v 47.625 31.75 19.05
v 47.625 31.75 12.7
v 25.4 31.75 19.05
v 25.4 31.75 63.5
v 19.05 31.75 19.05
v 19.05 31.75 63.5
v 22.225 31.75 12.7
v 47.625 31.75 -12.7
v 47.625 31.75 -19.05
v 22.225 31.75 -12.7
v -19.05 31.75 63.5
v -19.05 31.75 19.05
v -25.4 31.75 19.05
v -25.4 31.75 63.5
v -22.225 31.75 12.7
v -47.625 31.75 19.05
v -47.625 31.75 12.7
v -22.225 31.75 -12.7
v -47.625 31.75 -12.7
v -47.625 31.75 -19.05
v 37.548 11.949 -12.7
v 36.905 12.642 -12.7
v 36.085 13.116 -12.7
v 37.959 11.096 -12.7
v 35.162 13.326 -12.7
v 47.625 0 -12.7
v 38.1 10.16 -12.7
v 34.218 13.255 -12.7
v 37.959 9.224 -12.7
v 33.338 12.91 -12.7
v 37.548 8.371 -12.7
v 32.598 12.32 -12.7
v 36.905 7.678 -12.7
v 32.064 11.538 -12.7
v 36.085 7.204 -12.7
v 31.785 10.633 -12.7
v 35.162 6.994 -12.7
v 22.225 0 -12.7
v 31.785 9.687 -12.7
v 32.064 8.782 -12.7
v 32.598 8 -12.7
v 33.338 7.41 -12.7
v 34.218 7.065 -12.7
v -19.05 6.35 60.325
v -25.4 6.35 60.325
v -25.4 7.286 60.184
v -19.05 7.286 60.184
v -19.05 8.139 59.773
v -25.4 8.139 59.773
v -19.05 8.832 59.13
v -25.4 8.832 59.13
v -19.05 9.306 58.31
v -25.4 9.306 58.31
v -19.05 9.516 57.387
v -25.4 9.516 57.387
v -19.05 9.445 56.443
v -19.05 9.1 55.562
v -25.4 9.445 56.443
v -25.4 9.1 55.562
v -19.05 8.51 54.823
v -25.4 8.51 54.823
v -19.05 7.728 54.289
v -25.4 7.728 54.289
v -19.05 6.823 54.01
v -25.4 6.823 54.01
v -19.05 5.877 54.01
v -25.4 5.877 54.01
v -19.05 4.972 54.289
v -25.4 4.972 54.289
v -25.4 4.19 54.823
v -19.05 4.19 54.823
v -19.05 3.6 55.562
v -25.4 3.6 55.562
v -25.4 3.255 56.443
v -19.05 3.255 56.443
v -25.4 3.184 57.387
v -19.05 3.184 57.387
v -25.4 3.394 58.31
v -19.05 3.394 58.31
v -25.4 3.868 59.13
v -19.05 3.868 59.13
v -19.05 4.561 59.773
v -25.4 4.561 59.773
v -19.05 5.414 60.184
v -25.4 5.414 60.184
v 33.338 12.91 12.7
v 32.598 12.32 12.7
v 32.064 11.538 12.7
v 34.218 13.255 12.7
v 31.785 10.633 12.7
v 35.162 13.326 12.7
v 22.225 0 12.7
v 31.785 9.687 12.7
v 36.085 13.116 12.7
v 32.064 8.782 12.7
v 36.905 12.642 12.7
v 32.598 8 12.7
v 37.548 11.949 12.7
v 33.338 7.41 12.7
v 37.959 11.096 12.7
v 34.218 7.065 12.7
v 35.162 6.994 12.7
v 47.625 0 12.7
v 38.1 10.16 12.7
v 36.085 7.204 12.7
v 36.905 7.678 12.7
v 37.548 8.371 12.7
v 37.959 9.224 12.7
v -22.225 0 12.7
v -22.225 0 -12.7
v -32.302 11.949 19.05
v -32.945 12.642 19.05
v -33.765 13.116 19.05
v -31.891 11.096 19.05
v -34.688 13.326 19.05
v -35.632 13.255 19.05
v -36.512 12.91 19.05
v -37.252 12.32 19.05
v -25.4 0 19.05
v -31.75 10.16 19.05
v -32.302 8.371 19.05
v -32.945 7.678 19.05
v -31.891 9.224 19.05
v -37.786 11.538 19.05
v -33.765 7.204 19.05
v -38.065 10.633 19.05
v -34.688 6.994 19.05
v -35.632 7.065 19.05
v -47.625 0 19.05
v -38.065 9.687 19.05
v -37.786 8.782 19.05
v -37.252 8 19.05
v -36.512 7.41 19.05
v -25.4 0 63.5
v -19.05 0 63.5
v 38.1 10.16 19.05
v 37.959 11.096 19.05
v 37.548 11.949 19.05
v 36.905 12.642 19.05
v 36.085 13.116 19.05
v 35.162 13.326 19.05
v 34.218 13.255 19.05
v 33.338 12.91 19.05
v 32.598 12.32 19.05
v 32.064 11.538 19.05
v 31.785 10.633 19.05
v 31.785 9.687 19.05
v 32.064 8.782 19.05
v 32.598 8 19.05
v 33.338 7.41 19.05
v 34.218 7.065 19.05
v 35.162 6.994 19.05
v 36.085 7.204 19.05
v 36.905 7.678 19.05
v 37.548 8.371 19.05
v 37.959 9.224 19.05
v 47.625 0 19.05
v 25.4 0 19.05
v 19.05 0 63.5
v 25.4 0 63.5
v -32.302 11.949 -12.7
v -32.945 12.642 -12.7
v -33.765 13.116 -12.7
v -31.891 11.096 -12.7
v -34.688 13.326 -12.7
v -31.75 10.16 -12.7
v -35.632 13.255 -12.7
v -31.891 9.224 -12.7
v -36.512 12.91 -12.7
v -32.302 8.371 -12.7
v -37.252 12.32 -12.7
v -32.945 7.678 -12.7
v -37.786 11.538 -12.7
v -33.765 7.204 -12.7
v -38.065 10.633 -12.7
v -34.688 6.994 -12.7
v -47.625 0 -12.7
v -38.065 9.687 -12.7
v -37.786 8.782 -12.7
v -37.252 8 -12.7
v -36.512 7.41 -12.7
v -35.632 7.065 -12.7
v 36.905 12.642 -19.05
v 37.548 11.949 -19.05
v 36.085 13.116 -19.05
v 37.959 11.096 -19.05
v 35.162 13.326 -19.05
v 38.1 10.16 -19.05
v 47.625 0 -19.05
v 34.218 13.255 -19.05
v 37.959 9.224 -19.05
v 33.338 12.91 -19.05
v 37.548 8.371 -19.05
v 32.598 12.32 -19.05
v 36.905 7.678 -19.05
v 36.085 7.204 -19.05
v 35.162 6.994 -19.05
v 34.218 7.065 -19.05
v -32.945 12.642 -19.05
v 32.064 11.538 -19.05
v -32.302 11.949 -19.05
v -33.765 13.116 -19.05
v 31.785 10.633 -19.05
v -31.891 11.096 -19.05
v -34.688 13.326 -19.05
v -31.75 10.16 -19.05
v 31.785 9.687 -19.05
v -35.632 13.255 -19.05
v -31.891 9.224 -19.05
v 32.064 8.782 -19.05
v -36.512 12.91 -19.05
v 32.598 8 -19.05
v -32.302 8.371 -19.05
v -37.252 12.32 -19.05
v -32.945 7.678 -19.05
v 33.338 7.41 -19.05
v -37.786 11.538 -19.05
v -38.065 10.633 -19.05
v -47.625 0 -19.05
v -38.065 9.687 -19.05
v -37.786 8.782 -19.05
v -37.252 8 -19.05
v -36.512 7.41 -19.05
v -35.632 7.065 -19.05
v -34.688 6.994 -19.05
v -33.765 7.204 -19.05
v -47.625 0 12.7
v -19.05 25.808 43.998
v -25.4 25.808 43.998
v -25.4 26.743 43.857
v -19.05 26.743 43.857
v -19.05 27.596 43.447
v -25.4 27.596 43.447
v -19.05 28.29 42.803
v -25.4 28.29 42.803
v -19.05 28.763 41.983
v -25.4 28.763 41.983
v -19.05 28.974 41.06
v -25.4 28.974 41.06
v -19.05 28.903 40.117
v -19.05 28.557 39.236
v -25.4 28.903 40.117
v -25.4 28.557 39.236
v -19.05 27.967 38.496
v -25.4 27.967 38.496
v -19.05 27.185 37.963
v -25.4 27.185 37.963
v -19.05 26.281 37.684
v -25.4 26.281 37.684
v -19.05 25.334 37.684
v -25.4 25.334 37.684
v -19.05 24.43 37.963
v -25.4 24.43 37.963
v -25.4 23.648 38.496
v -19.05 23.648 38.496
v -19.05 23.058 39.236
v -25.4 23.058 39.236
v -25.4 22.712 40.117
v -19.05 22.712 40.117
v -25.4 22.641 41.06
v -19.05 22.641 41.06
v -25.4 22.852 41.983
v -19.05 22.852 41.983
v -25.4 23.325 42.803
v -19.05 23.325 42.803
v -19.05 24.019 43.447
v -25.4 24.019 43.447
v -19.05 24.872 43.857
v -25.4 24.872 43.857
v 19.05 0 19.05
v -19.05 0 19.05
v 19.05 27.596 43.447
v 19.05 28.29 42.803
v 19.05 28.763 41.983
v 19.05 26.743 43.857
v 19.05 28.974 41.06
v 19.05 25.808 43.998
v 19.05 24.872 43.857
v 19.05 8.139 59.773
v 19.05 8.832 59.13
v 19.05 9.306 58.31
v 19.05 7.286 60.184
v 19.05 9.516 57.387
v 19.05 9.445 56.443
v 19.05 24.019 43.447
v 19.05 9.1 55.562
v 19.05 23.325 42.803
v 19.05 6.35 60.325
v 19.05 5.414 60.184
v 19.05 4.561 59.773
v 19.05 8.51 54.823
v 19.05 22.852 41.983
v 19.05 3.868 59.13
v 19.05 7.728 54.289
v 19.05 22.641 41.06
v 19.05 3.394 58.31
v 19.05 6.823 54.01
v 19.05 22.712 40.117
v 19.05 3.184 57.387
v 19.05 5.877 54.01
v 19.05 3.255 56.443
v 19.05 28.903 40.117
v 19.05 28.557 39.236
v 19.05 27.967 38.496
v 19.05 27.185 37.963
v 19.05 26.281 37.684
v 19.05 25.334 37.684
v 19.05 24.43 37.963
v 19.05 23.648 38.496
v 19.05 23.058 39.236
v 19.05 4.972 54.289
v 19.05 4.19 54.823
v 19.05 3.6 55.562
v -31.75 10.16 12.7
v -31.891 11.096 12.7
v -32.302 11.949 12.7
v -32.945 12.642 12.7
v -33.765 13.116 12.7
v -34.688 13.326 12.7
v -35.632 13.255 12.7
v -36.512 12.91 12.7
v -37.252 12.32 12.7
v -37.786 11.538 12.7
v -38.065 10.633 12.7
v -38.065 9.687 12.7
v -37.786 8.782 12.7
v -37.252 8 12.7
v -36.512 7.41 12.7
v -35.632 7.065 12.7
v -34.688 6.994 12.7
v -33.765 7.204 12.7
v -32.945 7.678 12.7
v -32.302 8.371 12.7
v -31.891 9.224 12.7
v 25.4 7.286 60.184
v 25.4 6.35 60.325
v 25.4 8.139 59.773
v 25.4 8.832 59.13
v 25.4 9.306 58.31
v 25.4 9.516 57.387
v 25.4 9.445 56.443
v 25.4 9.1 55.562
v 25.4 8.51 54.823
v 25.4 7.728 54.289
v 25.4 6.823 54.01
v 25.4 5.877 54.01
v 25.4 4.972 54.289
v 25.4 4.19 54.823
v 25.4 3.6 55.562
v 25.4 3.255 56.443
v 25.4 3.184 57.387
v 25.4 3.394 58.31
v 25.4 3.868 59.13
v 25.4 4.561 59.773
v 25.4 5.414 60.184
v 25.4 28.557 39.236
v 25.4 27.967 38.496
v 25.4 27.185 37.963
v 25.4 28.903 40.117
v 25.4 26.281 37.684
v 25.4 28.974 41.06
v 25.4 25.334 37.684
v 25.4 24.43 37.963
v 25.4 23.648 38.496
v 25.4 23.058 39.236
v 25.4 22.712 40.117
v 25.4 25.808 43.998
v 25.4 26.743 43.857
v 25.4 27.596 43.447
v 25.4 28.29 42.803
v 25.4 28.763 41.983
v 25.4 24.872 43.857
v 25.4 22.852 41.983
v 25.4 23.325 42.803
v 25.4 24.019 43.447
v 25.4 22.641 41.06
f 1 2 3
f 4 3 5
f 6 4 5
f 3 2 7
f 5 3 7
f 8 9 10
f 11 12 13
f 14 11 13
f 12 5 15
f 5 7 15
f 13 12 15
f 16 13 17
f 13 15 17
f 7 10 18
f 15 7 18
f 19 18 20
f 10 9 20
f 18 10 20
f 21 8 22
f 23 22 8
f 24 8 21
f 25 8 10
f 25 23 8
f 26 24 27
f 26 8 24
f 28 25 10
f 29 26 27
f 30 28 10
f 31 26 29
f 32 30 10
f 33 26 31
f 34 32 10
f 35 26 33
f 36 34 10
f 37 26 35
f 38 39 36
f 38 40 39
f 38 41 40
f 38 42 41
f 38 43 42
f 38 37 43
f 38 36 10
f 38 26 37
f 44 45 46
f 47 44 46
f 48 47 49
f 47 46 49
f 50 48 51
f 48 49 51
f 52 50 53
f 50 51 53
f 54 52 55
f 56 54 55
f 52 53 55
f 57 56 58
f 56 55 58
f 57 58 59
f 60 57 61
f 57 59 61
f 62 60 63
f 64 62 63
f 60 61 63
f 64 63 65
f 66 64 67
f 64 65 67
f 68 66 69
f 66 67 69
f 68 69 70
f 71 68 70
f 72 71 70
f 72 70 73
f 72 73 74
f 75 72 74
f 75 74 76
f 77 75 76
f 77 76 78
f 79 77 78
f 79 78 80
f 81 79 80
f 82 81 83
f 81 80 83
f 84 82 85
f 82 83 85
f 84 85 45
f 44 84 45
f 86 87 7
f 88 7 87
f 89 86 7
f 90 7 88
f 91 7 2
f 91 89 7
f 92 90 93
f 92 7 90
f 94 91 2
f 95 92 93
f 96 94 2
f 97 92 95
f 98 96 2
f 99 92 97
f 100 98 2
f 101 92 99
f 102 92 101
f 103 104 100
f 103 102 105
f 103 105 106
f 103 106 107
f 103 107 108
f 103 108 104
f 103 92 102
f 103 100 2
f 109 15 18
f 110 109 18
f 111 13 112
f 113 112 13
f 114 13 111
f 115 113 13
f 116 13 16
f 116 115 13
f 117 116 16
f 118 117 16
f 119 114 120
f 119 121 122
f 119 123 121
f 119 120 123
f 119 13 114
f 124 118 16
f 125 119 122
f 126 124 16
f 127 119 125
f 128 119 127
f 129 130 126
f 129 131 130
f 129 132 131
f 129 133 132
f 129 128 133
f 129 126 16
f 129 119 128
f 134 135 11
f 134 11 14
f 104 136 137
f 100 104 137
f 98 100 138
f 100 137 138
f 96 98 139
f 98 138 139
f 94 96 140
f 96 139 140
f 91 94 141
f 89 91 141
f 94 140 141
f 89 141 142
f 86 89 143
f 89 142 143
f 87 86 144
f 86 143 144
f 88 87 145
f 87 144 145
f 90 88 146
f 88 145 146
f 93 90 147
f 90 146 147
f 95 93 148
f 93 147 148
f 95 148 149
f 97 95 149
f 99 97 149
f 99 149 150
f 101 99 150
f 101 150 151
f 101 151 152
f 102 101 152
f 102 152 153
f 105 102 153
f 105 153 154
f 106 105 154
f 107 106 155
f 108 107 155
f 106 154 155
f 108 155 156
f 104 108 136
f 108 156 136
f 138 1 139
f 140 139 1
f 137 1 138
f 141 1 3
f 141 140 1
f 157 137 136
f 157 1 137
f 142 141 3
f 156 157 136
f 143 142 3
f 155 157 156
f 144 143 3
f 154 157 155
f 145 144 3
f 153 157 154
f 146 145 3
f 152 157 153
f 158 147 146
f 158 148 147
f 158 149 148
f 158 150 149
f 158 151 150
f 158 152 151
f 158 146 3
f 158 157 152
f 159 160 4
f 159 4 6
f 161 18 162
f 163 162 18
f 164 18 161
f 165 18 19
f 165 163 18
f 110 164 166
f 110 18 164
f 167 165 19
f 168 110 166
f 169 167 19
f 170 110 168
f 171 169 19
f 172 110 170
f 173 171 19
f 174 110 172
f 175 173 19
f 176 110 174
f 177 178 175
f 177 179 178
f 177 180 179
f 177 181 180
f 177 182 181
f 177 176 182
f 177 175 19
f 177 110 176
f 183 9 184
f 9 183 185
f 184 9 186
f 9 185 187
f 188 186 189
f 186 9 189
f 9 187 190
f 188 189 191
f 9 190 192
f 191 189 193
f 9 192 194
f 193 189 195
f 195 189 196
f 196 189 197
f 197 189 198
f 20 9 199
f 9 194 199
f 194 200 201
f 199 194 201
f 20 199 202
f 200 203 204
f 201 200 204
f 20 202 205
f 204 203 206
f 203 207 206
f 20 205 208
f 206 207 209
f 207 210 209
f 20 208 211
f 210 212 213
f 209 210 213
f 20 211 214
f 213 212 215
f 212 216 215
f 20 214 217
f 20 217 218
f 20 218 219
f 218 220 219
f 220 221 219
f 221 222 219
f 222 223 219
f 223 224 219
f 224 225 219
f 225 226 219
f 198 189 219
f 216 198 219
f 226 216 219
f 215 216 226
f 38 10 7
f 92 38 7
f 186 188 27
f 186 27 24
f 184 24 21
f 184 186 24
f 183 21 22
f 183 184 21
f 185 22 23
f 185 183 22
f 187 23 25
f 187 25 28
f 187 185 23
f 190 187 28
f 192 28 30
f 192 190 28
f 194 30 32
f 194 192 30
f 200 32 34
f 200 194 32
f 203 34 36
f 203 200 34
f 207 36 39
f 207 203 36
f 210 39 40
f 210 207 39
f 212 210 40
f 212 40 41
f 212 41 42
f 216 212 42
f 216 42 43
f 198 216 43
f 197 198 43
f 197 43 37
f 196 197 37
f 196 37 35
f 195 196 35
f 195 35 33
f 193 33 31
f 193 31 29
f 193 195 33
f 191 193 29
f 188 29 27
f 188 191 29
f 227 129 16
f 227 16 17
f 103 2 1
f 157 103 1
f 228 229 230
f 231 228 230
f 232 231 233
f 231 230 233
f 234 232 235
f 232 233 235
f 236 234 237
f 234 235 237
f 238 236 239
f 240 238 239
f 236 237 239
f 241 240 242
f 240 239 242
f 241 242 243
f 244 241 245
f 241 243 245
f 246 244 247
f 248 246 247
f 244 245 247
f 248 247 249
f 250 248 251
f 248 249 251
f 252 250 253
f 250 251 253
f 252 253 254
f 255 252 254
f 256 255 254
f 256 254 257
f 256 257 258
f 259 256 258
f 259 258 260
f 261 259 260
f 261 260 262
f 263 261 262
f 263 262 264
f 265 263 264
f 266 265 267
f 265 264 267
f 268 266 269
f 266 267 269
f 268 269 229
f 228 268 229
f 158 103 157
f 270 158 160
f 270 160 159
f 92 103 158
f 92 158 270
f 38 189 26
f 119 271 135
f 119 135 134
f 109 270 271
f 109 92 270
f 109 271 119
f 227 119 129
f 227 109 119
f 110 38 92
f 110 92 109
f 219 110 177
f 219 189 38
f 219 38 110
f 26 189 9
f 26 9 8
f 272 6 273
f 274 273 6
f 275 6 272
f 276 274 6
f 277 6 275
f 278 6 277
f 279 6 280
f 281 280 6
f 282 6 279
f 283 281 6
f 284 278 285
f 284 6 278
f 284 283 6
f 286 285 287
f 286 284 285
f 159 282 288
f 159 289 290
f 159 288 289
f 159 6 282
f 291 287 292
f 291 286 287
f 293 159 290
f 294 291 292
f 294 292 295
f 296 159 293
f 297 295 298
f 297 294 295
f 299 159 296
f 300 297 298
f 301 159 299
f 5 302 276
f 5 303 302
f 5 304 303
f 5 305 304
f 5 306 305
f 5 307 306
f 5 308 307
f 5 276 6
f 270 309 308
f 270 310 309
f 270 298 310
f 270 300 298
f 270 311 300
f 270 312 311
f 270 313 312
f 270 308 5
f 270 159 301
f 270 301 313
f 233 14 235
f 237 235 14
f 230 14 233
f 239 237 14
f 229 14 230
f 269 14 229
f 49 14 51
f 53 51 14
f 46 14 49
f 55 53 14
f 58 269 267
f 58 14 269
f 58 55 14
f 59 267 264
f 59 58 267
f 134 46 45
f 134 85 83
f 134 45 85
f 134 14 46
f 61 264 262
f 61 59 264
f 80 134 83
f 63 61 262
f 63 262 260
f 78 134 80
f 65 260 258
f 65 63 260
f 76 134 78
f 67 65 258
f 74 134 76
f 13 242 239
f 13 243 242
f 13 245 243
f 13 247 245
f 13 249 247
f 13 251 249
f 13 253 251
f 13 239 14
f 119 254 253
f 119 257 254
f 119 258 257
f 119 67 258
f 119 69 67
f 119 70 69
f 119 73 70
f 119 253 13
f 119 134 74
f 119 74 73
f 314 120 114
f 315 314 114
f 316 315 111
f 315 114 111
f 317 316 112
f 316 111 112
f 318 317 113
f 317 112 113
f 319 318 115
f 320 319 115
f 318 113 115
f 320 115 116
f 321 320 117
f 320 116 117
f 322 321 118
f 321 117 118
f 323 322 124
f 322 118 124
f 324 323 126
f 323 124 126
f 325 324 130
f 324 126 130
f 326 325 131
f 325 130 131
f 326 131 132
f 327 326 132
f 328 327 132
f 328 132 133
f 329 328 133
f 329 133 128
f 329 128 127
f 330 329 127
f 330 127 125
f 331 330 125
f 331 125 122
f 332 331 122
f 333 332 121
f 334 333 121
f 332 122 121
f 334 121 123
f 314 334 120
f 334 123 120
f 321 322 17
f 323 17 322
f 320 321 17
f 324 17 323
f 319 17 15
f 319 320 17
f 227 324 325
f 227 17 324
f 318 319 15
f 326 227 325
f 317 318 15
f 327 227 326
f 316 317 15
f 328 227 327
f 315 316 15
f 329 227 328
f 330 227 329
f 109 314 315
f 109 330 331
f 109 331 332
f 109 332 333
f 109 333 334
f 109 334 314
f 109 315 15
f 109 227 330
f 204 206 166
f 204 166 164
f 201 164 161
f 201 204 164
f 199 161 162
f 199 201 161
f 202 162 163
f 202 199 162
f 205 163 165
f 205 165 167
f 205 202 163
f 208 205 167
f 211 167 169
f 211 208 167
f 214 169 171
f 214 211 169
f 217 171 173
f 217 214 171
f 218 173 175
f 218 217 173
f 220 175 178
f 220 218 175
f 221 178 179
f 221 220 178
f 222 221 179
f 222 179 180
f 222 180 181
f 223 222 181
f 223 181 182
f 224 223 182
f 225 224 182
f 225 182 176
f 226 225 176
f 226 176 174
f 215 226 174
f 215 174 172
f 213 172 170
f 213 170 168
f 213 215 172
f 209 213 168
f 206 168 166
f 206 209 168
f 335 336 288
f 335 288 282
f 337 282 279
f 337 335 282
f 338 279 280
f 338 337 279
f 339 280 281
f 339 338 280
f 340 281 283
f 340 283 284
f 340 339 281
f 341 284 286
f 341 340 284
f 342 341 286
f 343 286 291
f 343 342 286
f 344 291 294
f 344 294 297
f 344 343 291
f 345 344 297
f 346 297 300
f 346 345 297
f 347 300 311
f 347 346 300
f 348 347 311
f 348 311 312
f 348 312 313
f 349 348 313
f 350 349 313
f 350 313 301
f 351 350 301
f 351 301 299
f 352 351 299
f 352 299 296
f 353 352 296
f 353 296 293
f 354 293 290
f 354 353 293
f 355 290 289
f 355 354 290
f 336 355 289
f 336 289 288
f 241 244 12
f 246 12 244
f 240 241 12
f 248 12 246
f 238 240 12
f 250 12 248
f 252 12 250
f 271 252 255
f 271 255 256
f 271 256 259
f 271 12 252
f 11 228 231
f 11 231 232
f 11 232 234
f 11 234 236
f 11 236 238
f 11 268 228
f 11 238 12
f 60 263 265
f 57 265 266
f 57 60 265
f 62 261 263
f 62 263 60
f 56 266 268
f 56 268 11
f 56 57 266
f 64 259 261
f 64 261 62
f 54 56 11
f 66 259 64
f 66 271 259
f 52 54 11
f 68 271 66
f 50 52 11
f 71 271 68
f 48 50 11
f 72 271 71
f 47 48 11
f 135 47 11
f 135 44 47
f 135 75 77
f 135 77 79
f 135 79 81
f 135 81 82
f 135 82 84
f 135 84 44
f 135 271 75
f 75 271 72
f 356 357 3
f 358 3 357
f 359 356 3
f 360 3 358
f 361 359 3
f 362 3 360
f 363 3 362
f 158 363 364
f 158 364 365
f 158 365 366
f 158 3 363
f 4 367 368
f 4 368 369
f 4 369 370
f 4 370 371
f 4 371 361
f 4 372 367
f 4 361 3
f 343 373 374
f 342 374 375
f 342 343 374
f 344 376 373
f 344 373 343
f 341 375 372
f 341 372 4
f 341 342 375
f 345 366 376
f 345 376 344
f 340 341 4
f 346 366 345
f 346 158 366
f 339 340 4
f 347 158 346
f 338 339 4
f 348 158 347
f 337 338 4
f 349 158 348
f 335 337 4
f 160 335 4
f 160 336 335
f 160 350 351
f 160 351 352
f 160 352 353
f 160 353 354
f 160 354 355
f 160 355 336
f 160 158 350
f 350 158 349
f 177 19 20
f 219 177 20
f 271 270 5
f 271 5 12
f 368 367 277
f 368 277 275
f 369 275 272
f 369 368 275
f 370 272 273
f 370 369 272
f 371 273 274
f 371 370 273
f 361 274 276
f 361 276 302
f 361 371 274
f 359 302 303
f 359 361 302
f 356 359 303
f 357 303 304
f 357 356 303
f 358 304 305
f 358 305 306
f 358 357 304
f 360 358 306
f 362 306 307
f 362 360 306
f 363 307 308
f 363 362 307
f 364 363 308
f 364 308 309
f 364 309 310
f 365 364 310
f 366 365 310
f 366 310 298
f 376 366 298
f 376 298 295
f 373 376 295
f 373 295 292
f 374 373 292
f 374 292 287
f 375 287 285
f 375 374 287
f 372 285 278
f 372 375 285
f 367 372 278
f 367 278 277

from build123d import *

# Parameters (mm, degrees)
BOSS_EXTRUDE1_DEPTH = 31.75
SKETCH2_R           = 3.175
CUT_EXTRUDE1_DEPTH  = 6.35
SKETCH4_R           = 3.175
CUT_EXTRUDE2_DEPTH  = 6.35


with BuildPart() as part:
    # Sketch1 → Boss-Extrude1 (new body)
    with BuildSketch(Plane(origin=(0, 0, 0), x_dir=(1, 0, 0), z_dir=(0, 1, 0))):
        Polygon((-22.225, 19.05), (22.225, 19.05), (47.625, 19.05), (47.625, 12.7), (22.225, 12.7), (22.225, -12.7), (47.625, -12.7), (47.625, -19.05), (25.4, -19.05), (25.4, -63.5), (19.05, -63.5), (19.05, -19.05), (-19.05, -19.05), (-19.05, -63.5), (-25.4, -63.5), (-25.4, -19.05), (-47.625, -19.05), (-47.625, -12.7), (-22.225, -12.7), (-22.225, 12.7), (-47.625, 12.7), (-47.625, 19.05), align=None)
    extrude(amount=BOSS_EXTRUDE1_DEPTH)

    # Sketch2 → Cut-Extrude1 (cut)
    with BuildSketch(Plane.XY.offset(19.05)):
        with Locations((34.925, 10.16)):
            Circle(SKETCH2_R)
        with Locations((-34.925, 10.16)):
            Circle(SKETCH2_R)
    cut_extrude1 = extrude(amount=-CUT_EXTRUDE1_DEPTH, mode=Mode.SUBTRACT)

    # Mirror1: Cut-Extrude1 across plane
    add(cut_extrude1.mirror(Plane.XY), mode=Mode.SUBTRACT)

    # Sketch4 → Cut-Extrude2 (cut)
    with BuildSketch(Plane.ZY.offset(25.4)):
        with Locations((40.823194714, 25.807528855)):
            Circle(SKETCH4_R)
        with Locations((57.15, 6.35)):
            Circle(SKETCH4_R)
    cut_extrude2 = extrude(amount=-CUT_EXTRUDE2_DEPTH, mode=Mode.SUBTRACT)

    # Mirror2: Cut-Extrude2 across plane
    add(cut_extrude2.mirror(Plane(origin=(0, 0, 0), x_dir=(0, 0, 1), z_dir=(1, 0, 0))), mode=Mode.SUBTRACT)


solid = part.part
